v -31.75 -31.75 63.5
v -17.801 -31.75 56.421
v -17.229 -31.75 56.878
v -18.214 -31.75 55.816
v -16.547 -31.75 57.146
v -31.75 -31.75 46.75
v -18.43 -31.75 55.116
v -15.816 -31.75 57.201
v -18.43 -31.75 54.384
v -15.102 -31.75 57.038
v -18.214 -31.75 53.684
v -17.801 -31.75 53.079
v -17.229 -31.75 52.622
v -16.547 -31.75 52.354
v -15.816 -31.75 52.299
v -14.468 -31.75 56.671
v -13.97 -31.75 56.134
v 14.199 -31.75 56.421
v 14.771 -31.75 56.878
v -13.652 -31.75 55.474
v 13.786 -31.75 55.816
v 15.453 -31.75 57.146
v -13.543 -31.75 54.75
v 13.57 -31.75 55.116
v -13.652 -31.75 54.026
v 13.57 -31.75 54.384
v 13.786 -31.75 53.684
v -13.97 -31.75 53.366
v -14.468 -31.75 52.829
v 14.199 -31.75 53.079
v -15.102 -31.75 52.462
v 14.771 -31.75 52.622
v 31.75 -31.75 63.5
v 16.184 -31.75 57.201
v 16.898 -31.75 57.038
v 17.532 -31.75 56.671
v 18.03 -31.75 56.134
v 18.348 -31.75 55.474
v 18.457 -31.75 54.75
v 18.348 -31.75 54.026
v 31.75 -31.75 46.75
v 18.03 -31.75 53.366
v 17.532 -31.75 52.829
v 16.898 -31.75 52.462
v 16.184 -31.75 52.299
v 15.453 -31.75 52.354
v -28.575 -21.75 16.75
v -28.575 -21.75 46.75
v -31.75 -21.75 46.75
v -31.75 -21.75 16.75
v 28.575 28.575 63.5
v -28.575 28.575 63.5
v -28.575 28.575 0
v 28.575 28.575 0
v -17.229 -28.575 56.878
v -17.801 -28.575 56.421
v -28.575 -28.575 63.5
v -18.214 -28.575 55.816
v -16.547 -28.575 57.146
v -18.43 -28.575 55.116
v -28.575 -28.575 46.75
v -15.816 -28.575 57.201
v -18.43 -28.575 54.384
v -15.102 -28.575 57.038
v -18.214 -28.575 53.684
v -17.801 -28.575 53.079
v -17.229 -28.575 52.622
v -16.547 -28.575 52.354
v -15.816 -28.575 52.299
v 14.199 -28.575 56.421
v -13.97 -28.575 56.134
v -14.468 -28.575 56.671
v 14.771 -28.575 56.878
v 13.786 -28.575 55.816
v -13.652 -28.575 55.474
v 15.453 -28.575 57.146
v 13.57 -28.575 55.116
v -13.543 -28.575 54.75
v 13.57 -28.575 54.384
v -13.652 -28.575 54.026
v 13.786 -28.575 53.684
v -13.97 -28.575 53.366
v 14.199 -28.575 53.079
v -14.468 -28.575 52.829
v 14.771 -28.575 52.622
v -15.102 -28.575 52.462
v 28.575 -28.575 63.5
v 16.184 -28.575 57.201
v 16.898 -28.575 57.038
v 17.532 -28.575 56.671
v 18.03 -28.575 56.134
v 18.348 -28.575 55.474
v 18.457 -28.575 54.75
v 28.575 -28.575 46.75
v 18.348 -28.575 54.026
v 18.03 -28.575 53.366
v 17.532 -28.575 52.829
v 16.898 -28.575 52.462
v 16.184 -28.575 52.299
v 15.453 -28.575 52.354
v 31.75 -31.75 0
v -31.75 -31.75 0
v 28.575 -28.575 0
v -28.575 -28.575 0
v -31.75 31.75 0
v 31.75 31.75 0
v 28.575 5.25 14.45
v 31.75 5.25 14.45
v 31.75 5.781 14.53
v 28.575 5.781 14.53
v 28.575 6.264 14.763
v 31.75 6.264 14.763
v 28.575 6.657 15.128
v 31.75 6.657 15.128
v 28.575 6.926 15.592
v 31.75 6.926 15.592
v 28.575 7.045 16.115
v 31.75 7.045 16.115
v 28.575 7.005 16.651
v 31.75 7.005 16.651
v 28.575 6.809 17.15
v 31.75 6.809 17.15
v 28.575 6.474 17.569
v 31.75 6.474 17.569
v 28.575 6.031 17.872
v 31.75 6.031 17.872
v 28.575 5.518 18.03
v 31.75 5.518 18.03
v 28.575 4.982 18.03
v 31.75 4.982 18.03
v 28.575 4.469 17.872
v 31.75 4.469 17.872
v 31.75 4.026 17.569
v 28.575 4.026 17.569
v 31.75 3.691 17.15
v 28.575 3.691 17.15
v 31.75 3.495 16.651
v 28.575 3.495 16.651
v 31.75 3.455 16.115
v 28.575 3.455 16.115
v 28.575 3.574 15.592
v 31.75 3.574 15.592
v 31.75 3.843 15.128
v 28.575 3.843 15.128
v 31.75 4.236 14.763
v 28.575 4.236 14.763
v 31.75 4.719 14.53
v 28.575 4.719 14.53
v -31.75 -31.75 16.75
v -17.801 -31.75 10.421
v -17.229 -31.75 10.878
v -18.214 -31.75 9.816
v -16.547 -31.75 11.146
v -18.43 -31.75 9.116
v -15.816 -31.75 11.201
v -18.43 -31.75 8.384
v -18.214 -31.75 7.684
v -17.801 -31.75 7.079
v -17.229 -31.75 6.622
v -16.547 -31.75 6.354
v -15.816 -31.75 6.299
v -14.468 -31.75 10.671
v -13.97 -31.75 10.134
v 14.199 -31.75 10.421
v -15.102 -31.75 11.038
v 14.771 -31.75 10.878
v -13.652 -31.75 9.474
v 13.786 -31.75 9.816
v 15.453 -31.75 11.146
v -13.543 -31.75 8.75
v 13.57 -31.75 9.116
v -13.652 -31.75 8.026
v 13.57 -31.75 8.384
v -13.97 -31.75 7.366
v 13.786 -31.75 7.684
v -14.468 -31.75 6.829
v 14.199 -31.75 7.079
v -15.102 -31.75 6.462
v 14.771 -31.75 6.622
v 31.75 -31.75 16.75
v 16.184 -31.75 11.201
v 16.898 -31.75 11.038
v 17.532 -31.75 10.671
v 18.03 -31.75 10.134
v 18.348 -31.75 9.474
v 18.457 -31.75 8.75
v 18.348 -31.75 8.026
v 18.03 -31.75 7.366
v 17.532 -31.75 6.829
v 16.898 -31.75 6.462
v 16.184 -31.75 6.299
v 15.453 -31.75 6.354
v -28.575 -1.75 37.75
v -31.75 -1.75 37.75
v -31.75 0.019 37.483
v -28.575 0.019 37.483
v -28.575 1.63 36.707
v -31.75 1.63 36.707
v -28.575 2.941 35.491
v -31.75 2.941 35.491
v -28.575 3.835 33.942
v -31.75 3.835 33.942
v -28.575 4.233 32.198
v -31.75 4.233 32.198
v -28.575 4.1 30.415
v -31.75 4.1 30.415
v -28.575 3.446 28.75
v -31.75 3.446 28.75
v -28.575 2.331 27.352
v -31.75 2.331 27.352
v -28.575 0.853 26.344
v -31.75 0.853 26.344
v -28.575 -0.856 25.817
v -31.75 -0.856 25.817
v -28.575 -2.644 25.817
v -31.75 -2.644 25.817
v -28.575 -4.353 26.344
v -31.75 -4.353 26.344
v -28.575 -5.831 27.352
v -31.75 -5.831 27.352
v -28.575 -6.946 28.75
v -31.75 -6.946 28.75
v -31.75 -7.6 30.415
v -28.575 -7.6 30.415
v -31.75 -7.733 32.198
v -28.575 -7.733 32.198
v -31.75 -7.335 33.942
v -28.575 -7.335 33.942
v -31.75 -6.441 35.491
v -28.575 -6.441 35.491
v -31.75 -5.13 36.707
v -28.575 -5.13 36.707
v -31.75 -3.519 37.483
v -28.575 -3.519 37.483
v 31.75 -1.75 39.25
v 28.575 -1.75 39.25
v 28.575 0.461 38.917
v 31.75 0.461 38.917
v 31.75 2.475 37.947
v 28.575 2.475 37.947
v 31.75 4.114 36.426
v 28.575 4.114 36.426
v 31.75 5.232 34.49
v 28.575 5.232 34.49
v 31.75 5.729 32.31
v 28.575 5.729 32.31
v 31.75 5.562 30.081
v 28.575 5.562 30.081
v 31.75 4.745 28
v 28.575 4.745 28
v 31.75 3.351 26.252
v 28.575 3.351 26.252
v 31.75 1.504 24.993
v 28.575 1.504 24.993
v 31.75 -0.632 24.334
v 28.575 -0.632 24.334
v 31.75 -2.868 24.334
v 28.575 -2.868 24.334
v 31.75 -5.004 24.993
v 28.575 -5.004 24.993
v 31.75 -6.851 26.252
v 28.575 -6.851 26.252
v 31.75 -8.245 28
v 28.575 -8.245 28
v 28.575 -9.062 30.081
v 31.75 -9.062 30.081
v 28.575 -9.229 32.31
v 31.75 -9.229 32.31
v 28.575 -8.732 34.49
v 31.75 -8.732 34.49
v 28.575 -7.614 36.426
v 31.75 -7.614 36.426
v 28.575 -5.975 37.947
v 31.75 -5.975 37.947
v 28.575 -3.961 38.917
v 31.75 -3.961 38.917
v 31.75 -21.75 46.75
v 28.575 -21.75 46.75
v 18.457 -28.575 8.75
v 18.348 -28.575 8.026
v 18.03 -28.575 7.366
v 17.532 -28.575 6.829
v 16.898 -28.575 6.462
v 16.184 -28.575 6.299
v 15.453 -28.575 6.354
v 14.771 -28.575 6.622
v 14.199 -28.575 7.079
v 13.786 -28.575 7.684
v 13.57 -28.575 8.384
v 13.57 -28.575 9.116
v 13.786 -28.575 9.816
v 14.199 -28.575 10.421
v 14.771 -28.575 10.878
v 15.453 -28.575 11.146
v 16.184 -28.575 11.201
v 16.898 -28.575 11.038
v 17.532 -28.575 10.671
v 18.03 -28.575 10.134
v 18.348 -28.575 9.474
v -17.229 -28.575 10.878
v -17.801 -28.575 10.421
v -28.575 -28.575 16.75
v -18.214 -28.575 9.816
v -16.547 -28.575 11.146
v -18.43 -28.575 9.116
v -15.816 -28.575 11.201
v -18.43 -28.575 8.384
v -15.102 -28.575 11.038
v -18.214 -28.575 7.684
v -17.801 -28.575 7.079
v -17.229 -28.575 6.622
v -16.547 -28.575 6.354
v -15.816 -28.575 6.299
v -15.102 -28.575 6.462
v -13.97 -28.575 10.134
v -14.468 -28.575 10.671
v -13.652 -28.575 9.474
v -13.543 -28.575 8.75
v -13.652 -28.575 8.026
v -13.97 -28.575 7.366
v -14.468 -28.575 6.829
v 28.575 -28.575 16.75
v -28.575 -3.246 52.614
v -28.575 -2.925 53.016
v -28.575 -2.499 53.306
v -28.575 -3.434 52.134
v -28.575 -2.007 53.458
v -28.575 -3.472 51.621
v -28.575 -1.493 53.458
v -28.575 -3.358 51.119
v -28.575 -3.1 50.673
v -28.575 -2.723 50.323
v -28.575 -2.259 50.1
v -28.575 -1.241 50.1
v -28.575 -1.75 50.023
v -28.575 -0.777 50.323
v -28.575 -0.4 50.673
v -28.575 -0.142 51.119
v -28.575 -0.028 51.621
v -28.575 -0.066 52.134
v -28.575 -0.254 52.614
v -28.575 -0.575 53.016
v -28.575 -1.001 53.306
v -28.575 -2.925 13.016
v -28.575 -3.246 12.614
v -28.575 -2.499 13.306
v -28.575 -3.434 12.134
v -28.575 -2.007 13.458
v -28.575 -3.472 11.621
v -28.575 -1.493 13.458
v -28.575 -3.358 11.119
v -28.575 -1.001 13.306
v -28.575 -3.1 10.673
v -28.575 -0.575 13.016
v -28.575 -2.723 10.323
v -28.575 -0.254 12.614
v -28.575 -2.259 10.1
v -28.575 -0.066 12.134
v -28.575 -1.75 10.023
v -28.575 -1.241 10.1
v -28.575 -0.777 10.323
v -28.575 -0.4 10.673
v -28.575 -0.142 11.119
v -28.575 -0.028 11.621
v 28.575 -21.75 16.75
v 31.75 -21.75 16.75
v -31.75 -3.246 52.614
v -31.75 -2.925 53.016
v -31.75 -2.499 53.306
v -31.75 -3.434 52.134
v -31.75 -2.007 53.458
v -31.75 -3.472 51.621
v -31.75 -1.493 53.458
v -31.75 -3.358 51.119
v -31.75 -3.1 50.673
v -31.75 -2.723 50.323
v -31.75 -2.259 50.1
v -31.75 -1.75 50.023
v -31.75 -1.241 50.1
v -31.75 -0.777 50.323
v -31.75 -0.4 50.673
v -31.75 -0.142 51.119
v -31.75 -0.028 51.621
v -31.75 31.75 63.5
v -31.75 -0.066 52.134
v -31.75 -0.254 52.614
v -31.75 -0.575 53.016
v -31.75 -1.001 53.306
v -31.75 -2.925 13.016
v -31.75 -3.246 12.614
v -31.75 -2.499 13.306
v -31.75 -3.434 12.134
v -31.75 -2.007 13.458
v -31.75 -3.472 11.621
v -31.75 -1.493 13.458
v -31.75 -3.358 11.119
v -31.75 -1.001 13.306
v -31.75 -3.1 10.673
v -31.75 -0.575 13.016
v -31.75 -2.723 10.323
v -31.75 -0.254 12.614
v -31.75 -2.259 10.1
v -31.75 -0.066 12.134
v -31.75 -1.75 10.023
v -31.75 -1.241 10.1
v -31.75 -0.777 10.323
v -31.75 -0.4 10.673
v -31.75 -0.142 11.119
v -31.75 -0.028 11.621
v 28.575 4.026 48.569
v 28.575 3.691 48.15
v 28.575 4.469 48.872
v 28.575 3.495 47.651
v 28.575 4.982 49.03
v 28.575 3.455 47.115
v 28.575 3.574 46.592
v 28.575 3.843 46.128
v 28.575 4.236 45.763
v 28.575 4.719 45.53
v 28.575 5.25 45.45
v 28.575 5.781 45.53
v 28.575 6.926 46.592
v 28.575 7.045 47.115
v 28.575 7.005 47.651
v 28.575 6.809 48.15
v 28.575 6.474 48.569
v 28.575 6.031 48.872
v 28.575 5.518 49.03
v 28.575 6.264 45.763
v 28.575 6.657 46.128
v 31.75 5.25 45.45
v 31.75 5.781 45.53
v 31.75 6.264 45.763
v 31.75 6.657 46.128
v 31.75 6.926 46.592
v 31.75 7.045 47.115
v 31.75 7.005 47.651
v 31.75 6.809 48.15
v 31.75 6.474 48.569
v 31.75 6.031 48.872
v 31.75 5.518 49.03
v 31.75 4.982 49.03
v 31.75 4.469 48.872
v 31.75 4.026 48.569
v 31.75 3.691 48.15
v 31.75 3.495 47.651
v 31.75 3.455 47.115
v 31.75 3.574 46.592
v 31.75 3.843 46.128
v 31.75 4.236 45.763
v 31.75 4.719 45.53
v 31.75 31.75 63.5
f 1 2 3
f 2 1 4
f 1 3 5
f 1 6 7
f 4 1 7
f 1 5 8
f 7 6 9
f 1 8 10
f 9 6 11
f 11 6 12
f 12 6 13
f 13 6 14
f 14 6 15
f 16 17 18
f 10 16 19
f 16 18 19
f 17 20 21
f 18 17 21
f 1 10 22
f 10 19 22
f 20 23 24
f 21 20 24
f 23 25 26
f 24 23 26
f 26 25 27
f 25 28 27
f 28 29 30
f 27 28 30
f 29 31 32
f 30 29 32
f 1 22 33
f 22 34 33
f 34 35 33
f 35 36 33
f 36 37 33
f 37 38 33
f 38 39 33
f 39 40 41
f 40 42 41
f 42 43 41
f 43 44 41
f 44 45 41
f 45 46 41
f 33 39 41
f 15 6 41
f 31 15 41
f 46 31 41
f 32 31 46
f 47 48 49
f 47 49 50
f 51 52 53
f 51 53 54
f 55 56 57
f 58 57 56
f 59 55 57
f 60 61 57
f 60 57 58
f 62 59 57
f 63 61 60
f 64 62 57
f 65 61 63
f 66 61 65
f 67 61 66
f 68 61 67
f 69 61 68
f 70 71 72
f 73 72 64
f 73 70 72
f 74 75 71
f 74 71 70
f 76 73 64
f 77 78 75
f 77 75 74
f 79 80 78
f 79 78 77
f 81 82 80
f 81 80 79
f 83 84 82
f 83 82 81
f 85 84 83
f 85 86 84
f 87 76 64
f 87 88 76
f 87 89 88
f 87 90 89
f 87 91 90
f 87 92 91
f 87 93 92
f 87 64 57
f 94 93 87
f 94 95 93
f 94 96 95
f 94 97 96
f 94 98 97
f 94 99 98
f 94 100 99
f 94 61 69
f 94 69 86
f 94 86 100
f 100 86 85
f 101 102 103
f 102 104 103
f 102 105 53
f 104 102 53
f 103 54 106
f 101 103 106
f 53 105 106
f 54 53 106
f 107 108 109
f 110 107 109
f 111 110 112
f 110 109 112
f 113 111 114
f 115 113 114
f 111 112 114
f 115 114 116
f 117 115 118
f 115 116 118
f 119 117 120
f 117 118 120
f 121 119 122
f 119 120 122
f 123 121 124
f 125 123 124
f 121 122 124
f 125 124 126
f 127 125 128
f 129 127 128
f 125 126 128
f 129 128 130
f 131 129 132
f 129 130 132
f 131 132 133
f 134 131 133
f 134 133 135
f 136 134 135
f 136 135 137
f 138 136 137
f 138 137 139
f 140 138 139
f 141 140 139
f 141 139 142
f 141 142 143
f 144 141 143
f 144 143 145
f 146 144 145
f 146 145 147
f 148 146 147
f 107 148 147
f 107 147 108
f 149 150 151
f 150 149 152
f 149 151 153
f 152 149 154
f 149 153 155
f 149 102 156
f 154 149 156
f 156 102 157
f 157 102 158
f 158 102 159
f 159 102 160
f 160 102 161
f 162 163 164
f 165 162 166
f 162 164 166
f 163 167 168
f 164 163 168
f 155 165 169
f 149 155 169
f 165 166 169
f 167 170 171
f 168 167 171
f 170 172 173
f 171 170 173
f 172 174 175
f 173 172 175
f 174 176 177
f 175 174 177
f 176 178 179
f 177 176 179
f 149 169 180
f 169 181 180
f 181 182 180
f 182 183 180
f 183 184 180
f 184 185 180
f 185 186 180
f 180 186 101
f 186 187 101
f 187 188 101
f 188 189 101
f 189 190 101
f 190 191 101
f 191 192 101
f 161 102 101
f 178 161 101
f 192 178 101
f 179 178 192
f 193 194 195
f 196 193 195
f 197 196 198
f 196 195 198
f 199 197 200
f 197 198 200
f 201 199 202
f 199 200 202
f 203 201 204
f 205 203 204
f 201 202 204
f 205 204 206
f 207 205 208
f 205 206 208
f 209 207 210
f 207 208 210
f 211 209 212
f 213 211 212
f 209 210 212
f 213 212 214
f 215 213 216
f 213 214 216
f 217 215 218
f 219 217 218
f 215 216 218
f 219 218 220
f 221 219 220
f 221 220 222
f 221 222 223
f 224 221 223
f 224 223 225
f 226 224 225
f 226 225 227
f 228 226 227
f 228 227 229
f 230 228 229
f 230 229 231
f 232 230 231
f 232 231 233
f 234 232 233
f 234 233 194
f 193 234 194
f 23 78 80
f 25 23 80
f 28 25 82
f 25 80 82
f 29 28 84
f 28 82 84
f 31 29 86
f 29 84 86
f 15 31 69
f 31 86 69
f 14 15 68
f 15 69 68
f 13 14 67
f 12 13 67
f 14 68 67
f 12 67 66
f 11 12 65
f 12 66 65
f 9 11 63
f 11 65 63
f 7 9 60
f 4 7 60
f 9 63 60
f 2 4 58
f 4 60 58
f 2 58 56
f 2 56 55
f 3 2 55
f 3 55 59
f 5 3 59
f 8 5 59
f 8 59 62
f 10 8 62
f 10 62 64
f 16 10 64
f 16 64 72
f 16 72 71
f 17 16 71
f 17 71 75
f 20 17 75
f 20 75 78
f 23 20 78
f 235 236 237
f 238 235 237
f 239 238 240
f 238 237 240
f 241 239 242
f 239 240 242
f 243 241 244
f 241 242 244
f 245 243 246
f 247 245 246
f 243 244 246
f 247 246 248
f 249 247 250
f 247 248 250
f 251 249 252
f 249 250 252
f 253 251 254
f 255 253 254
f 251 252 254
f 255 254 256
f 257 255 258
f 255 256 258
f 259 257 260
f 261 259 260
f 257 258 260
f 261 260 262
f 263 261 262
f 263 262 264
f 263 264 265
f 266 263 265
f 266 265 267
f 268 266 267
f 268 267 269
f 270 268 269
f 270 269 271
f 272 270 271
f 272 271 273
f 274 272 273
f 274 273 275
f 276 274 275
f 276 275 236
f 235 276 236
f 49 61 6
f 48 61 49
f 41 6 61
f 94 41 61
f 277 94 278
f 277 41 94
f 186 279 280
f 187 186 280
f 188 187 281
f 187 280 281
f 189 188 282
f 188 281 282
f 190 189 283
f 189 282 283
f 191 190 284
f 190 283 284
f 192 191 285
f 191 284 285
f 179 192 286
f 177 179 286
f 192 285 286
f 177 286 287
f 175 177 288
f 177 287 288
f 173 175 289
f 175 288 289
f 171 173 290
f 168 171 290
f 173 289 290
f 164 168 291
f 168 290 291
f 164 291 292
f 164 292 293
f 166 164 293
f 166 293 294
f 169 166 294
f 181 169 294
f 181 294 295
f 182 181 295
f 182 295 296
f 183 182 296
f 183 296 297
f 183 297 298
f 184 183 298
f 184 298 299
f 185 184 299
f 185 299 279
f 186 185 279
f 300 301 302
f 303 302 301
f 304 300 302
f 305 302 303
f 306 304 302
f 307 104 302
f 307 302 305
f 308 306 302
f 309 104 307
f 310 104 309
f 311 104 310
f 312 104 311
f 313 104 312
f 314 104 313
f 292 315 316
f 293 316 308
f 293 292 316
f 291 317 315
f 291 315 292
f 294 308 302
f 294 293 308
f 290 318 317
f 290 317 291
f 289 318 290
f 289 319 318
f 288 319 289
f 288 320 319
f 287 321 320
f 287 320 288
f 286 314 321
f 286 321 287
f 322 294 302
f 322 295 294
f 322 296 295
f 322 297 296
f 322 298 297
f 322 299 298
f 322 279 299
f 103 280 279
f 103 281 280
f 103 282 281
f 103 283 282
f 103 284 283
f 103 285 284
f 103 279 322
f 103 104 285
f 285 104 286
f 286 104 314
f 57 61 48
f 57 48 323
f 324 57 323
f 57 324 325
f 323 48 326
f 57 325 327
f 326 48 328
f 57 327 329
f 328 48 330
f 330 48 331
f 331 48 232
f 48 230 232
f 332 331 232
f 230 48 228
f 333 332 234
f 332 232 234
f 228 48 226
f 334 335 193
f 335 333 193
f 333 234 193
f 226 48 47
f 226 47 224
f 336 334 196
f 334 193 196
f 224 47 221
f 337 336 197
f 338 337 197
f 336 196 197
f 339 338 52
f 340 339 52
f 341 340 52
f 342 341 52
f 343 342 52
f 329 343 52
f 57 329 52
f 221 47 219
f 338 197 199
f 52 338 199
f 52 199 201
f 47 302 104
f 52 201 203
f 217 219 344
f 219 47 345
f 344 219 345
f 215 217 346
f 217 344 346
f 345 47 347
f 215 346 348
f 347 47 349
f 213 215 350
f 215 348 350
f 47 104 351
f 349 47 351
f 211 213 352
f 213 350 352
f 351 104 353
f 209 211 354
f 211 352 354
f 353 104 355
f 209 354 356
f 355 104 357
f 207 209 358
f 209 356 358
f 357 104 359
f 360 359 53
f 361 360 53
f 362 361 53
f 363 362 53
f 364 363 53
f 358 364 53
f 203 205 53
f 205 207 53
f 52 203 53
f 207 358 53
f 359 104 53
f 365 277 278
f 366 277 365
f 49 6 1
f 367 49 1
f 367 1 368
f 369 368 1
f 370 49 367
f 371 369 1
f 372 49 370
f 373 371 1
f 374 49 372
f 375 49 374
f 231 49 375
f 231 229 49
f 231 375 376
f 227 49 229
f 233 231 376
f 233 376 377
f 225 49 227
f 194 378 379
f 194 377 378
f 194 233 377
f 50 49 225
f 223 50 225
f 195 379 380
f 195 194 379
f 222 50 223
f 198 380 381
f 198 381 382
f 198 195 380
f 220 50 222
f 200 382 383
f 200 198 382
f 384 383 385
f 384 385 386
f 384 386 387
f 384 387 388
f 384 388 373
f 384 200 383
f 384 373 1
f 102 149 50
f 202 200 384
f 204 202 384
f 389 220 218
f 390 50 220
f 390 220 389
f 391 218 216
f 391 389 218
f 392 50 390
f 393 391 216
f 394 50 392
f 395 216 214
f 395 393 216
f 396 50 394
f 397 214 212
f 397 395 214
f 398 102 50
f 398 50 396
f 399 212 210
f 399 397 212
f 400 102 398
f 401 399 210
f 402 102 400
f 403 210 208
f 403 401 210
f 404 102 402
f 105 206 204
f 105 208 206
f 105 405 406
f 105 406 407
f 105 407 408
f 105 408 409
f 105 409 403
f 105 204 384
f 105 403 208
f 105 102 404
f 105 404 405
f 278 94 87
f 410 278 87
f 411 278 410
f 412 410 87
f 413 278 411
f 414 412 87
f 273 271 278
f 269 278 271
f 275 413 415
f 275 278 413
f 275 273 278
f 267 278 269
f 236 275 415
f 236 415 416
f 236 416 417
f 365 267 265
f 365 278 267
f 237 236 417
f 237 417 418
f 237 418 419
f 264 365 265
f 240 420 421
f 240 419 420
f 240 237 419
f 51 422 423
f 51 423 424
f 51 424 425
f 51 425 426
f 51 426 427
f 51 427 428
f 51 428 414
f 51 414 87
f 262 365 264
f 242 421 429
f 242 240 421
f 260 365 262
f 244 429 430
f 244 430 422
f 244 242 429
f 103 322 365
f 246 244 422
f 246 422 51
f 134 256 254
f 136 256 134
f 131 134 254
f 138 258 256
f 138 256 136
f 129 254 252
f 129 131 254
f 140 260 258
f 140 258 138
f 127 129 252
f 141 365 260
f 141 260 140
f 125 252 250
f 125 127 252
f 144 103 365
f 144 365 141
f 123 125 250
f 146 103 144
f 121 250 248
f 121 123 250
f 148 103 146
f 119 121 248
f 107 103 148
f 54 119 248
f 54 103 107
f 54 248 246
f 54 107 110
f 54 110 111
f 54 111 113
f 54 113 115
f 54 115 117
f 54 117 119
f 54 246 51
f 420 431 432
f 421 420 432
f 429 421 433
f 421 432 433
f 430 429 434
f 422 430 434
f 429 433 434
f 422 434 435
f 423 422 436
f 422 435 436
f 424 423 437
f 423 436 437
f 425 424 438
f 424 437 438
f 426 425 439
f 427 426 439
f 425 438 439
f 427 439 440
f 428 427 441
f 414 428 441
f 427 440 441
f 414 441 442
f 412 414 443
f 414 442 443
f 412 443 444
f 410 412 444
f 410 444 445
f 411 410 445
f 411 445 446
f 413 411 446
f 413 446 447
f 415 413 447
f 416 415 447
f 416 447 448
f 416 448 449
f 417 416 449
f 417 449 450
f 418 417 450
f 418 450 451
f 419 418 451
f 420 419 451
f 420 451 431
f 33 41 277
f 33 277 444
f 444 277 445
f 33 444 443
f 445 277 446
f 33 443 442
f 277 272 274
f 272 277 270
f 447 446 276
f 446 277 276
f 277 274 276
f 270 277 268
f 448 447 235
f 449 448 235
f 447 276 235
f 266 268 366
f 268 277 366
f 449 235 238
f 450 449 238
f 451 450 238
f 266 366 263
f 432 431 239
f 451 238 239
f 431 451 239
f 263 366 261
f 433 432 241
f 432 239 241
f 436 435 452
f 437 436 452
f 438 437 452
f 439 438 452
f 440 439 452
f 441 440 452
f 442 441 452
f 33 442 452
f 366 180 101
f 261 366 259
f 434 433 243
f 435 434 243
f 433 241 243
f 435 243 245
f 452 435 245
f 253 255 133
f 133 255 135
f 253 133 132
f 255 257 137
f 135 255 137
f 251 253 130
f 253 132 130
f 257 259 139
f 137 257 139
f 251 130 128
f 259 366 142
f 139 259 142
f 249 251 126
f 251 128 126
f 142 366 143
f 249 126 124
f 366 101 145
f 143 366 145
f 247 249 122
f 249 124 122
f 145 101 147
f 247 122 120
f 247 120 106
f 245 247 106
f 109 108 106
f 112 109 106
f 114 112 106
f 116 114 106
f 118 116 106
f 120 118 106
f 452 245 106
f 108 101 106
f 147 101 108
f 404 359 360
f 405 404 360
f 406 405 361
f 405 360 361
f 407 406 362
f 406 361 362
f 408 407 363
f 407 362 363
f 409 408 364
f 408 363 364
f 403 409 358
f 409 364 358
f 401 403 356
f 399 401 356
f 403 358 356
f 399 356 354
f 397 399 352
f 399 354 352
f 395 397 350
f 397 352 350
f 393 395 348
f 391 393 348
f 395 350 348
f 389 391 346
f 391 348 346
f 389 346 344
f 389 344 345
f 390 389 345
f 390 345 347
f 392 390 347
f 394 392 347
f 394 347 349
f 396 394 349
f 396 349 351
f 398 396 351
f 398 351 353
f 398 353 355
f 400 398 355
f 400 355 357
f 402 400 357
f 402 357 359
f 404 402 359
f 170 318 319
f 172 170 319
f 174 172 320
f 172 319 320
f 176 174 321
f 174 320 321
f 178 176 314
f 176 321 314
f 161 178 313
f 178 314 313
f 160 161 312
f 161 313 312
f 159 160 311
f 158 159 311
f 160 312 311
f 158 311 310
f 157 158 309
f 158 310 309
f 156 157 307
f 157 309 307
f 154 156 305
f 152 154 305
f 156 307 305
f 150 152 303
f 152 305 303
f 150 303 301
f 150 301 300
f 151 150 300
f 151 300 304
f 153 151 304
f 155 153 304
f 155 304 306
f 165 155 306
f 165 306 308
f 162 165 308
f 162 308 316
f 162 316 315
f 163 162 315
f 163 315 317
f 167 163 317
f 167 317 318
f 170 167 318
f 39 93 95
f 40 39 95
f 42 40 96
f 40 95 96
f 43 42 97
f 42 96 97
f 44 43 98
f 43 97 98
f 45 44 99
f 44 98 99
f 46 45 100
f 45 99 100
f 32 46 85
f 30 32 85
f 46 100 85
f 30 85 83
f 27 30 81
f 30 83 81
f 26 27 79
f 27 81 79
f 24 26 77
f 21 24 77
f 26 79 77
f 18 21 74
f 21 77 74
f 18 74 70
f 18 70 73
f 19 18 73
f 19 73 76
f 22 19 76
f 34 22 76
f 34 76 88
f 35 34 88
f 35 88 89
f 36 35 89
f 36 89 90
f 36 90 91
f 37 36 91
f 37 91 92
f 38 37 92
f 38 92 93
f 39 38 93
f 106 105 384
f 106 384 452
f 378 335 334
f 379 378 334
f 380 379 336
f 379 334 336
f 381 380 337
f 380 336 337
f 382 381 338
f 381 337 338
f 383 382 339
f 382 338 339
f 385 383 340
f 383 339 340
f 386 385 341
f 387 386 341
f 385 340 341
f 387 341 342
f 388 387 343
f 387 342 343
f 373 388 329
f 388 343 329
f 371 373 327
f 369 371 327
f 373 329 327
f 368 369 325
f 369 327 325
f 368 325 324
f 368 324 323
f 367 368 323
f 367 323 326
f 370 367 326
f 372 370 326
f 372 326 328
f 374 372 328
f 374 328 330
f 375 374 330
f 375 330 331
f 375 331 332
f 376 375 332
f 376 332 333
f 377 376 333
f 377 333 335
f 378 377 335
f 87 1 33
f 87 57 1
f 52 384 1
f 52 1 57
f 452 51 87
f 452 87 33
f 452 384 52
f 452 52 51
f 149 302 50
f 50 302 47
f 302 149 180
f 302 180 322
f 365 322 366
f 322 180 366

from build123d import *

# Parameters (mm, degrees)
SKETCH1_W                 = 63.5
SKETCH1_H                 = 63.5
SKETCH1_W_2               = 57.15
SKETCH1_H_2               = 57.15
EXTRUDE_THIN1_DEPTH       = 63.5
SKETCH2_W                 = 30
SKETCH2_H                 = 20
CUT_EXTRUDE1_DEPTH        = 64.5
SKETCH5_R                 = 7.5
CUT_EXTRUDE3_DEPTH        = 4.175
M3_CLEARANCE_HOLE1_D      = 3.6
M3_CLEARANCE_HOLE1_DEPTH  = 3.175
F_8_32_TAPPED_HOLE1_D     = 3.4544
F_8_32_TAPPED_HOLE1_DEPTH = 3.175
CUT_EXTRUDE4_REACH        = 65.5
SKETCH13_R                = 6
F_8_CLEARANCE_HOLE1_D     = 4.9149
F_8_CLEARANCE_HOLE1_DEPTH = 3.175


with BuildPart() as part:
    # Sketch1 → Extrude-Thin1 (new body)
    with BuildSketch(Plane.XY):
        Rectangle(SKETCH1_W, SKETCH1_H)
        Rectangle(SKETCH1_W_2, SKETCH1_H_2, mode=Mode.SUBTRACT)
    extrude(amount=EXTRUDE_THIN1_DEPTH)

    # Sketch2 → Cut-Extrude1 (cut, through all)
    with BuildSketch(Plane(origin=(31.75, 0, 0), x_dir=(0, 0, -1), z_dir=(1, 0, 0))):
        with Locations((-31.75, -31.75)):
            Rectangle(SKETCH2_W, SKETCH2_H)
    extrude(amount=-CUT_EXTRUDE1_DEPTH, mode=Mode.SUBTRACT)

    # Sketch5 → Cut-Extrude3 (cut, through all)
    with BuildSketch(Plane(origin=(28.575, 11.830115966, 29.988402314), x_dir=(0, 0, 1), z_dir=(-1, 0, 0))):
        with Locations((1.761597686, -13.580115966)):
            Circle(SKETCH5_R)
    extrude(amount=-CUT_EXTRUDE3_DEPTH, mode=Mode.SUBTRACT)

    # M3 Clearance Hole1
    with Locations(Plane(origin=(28.575, 11.830115966, 29.988402314), x_dir=(0, 0, 1), z_dir=(-1, 0, 0))):
        with Locations((-13.738402314, -6.580115966), (17.261597686, -6.580115966)):
            Hole(M3_CLEARANCE_HOLE1_D / 2, depth=M3_CLEARANCE_HOLE1_DEPTH)

    # #8-32 Tapped Hole1
    with Locations(Plane.ZY.offset(31.75)):
        with Locations((51.75, -1.75), (11.75, -1.75)):
            Hole(F_8_32_TAPPED_HOLE1_D / 2, depth=F_8_32_TAPPED_HOLE1_DEPTH)

    # Sketch13 → Cut-Extrude4 (cut, up to next)
    with BuildSketch(Plane.ZY.offset(31.75), mode=Mode.PRIVATE) as cut_extrude4_sk1:
        with Locations((31.75, -1.75)):
            Circle(SKETCH13_R)
    cut_extrude4_tool1 = extrude(cut_extrude4_sk1.sketch, amount=-CUT_EXTRUDE4_REACH, mode=Mode.PRIVATE) & part.part
    add(cut_extrude4_tool1.solids().sort_by_distance((-31.75, -1.75, 31.75))[0], mode=Mode.SUBTRACT)

    # #8 Clearance Hole1
    with Locations(Plane(origin=(0, -31.75, 0), x_dir=(-1, 0, 0), z_dir=(0, -1, 0))):
        with Locations((16, -8.75), (-16, -8.75), (-16, -54.75), (16, -54.75)):
            Hole(F_8_CLEARANCE_HOLE1_D / 2, depth=F_8_CLEARANCE_HOLE1_DEPTH)


solid = part.part
